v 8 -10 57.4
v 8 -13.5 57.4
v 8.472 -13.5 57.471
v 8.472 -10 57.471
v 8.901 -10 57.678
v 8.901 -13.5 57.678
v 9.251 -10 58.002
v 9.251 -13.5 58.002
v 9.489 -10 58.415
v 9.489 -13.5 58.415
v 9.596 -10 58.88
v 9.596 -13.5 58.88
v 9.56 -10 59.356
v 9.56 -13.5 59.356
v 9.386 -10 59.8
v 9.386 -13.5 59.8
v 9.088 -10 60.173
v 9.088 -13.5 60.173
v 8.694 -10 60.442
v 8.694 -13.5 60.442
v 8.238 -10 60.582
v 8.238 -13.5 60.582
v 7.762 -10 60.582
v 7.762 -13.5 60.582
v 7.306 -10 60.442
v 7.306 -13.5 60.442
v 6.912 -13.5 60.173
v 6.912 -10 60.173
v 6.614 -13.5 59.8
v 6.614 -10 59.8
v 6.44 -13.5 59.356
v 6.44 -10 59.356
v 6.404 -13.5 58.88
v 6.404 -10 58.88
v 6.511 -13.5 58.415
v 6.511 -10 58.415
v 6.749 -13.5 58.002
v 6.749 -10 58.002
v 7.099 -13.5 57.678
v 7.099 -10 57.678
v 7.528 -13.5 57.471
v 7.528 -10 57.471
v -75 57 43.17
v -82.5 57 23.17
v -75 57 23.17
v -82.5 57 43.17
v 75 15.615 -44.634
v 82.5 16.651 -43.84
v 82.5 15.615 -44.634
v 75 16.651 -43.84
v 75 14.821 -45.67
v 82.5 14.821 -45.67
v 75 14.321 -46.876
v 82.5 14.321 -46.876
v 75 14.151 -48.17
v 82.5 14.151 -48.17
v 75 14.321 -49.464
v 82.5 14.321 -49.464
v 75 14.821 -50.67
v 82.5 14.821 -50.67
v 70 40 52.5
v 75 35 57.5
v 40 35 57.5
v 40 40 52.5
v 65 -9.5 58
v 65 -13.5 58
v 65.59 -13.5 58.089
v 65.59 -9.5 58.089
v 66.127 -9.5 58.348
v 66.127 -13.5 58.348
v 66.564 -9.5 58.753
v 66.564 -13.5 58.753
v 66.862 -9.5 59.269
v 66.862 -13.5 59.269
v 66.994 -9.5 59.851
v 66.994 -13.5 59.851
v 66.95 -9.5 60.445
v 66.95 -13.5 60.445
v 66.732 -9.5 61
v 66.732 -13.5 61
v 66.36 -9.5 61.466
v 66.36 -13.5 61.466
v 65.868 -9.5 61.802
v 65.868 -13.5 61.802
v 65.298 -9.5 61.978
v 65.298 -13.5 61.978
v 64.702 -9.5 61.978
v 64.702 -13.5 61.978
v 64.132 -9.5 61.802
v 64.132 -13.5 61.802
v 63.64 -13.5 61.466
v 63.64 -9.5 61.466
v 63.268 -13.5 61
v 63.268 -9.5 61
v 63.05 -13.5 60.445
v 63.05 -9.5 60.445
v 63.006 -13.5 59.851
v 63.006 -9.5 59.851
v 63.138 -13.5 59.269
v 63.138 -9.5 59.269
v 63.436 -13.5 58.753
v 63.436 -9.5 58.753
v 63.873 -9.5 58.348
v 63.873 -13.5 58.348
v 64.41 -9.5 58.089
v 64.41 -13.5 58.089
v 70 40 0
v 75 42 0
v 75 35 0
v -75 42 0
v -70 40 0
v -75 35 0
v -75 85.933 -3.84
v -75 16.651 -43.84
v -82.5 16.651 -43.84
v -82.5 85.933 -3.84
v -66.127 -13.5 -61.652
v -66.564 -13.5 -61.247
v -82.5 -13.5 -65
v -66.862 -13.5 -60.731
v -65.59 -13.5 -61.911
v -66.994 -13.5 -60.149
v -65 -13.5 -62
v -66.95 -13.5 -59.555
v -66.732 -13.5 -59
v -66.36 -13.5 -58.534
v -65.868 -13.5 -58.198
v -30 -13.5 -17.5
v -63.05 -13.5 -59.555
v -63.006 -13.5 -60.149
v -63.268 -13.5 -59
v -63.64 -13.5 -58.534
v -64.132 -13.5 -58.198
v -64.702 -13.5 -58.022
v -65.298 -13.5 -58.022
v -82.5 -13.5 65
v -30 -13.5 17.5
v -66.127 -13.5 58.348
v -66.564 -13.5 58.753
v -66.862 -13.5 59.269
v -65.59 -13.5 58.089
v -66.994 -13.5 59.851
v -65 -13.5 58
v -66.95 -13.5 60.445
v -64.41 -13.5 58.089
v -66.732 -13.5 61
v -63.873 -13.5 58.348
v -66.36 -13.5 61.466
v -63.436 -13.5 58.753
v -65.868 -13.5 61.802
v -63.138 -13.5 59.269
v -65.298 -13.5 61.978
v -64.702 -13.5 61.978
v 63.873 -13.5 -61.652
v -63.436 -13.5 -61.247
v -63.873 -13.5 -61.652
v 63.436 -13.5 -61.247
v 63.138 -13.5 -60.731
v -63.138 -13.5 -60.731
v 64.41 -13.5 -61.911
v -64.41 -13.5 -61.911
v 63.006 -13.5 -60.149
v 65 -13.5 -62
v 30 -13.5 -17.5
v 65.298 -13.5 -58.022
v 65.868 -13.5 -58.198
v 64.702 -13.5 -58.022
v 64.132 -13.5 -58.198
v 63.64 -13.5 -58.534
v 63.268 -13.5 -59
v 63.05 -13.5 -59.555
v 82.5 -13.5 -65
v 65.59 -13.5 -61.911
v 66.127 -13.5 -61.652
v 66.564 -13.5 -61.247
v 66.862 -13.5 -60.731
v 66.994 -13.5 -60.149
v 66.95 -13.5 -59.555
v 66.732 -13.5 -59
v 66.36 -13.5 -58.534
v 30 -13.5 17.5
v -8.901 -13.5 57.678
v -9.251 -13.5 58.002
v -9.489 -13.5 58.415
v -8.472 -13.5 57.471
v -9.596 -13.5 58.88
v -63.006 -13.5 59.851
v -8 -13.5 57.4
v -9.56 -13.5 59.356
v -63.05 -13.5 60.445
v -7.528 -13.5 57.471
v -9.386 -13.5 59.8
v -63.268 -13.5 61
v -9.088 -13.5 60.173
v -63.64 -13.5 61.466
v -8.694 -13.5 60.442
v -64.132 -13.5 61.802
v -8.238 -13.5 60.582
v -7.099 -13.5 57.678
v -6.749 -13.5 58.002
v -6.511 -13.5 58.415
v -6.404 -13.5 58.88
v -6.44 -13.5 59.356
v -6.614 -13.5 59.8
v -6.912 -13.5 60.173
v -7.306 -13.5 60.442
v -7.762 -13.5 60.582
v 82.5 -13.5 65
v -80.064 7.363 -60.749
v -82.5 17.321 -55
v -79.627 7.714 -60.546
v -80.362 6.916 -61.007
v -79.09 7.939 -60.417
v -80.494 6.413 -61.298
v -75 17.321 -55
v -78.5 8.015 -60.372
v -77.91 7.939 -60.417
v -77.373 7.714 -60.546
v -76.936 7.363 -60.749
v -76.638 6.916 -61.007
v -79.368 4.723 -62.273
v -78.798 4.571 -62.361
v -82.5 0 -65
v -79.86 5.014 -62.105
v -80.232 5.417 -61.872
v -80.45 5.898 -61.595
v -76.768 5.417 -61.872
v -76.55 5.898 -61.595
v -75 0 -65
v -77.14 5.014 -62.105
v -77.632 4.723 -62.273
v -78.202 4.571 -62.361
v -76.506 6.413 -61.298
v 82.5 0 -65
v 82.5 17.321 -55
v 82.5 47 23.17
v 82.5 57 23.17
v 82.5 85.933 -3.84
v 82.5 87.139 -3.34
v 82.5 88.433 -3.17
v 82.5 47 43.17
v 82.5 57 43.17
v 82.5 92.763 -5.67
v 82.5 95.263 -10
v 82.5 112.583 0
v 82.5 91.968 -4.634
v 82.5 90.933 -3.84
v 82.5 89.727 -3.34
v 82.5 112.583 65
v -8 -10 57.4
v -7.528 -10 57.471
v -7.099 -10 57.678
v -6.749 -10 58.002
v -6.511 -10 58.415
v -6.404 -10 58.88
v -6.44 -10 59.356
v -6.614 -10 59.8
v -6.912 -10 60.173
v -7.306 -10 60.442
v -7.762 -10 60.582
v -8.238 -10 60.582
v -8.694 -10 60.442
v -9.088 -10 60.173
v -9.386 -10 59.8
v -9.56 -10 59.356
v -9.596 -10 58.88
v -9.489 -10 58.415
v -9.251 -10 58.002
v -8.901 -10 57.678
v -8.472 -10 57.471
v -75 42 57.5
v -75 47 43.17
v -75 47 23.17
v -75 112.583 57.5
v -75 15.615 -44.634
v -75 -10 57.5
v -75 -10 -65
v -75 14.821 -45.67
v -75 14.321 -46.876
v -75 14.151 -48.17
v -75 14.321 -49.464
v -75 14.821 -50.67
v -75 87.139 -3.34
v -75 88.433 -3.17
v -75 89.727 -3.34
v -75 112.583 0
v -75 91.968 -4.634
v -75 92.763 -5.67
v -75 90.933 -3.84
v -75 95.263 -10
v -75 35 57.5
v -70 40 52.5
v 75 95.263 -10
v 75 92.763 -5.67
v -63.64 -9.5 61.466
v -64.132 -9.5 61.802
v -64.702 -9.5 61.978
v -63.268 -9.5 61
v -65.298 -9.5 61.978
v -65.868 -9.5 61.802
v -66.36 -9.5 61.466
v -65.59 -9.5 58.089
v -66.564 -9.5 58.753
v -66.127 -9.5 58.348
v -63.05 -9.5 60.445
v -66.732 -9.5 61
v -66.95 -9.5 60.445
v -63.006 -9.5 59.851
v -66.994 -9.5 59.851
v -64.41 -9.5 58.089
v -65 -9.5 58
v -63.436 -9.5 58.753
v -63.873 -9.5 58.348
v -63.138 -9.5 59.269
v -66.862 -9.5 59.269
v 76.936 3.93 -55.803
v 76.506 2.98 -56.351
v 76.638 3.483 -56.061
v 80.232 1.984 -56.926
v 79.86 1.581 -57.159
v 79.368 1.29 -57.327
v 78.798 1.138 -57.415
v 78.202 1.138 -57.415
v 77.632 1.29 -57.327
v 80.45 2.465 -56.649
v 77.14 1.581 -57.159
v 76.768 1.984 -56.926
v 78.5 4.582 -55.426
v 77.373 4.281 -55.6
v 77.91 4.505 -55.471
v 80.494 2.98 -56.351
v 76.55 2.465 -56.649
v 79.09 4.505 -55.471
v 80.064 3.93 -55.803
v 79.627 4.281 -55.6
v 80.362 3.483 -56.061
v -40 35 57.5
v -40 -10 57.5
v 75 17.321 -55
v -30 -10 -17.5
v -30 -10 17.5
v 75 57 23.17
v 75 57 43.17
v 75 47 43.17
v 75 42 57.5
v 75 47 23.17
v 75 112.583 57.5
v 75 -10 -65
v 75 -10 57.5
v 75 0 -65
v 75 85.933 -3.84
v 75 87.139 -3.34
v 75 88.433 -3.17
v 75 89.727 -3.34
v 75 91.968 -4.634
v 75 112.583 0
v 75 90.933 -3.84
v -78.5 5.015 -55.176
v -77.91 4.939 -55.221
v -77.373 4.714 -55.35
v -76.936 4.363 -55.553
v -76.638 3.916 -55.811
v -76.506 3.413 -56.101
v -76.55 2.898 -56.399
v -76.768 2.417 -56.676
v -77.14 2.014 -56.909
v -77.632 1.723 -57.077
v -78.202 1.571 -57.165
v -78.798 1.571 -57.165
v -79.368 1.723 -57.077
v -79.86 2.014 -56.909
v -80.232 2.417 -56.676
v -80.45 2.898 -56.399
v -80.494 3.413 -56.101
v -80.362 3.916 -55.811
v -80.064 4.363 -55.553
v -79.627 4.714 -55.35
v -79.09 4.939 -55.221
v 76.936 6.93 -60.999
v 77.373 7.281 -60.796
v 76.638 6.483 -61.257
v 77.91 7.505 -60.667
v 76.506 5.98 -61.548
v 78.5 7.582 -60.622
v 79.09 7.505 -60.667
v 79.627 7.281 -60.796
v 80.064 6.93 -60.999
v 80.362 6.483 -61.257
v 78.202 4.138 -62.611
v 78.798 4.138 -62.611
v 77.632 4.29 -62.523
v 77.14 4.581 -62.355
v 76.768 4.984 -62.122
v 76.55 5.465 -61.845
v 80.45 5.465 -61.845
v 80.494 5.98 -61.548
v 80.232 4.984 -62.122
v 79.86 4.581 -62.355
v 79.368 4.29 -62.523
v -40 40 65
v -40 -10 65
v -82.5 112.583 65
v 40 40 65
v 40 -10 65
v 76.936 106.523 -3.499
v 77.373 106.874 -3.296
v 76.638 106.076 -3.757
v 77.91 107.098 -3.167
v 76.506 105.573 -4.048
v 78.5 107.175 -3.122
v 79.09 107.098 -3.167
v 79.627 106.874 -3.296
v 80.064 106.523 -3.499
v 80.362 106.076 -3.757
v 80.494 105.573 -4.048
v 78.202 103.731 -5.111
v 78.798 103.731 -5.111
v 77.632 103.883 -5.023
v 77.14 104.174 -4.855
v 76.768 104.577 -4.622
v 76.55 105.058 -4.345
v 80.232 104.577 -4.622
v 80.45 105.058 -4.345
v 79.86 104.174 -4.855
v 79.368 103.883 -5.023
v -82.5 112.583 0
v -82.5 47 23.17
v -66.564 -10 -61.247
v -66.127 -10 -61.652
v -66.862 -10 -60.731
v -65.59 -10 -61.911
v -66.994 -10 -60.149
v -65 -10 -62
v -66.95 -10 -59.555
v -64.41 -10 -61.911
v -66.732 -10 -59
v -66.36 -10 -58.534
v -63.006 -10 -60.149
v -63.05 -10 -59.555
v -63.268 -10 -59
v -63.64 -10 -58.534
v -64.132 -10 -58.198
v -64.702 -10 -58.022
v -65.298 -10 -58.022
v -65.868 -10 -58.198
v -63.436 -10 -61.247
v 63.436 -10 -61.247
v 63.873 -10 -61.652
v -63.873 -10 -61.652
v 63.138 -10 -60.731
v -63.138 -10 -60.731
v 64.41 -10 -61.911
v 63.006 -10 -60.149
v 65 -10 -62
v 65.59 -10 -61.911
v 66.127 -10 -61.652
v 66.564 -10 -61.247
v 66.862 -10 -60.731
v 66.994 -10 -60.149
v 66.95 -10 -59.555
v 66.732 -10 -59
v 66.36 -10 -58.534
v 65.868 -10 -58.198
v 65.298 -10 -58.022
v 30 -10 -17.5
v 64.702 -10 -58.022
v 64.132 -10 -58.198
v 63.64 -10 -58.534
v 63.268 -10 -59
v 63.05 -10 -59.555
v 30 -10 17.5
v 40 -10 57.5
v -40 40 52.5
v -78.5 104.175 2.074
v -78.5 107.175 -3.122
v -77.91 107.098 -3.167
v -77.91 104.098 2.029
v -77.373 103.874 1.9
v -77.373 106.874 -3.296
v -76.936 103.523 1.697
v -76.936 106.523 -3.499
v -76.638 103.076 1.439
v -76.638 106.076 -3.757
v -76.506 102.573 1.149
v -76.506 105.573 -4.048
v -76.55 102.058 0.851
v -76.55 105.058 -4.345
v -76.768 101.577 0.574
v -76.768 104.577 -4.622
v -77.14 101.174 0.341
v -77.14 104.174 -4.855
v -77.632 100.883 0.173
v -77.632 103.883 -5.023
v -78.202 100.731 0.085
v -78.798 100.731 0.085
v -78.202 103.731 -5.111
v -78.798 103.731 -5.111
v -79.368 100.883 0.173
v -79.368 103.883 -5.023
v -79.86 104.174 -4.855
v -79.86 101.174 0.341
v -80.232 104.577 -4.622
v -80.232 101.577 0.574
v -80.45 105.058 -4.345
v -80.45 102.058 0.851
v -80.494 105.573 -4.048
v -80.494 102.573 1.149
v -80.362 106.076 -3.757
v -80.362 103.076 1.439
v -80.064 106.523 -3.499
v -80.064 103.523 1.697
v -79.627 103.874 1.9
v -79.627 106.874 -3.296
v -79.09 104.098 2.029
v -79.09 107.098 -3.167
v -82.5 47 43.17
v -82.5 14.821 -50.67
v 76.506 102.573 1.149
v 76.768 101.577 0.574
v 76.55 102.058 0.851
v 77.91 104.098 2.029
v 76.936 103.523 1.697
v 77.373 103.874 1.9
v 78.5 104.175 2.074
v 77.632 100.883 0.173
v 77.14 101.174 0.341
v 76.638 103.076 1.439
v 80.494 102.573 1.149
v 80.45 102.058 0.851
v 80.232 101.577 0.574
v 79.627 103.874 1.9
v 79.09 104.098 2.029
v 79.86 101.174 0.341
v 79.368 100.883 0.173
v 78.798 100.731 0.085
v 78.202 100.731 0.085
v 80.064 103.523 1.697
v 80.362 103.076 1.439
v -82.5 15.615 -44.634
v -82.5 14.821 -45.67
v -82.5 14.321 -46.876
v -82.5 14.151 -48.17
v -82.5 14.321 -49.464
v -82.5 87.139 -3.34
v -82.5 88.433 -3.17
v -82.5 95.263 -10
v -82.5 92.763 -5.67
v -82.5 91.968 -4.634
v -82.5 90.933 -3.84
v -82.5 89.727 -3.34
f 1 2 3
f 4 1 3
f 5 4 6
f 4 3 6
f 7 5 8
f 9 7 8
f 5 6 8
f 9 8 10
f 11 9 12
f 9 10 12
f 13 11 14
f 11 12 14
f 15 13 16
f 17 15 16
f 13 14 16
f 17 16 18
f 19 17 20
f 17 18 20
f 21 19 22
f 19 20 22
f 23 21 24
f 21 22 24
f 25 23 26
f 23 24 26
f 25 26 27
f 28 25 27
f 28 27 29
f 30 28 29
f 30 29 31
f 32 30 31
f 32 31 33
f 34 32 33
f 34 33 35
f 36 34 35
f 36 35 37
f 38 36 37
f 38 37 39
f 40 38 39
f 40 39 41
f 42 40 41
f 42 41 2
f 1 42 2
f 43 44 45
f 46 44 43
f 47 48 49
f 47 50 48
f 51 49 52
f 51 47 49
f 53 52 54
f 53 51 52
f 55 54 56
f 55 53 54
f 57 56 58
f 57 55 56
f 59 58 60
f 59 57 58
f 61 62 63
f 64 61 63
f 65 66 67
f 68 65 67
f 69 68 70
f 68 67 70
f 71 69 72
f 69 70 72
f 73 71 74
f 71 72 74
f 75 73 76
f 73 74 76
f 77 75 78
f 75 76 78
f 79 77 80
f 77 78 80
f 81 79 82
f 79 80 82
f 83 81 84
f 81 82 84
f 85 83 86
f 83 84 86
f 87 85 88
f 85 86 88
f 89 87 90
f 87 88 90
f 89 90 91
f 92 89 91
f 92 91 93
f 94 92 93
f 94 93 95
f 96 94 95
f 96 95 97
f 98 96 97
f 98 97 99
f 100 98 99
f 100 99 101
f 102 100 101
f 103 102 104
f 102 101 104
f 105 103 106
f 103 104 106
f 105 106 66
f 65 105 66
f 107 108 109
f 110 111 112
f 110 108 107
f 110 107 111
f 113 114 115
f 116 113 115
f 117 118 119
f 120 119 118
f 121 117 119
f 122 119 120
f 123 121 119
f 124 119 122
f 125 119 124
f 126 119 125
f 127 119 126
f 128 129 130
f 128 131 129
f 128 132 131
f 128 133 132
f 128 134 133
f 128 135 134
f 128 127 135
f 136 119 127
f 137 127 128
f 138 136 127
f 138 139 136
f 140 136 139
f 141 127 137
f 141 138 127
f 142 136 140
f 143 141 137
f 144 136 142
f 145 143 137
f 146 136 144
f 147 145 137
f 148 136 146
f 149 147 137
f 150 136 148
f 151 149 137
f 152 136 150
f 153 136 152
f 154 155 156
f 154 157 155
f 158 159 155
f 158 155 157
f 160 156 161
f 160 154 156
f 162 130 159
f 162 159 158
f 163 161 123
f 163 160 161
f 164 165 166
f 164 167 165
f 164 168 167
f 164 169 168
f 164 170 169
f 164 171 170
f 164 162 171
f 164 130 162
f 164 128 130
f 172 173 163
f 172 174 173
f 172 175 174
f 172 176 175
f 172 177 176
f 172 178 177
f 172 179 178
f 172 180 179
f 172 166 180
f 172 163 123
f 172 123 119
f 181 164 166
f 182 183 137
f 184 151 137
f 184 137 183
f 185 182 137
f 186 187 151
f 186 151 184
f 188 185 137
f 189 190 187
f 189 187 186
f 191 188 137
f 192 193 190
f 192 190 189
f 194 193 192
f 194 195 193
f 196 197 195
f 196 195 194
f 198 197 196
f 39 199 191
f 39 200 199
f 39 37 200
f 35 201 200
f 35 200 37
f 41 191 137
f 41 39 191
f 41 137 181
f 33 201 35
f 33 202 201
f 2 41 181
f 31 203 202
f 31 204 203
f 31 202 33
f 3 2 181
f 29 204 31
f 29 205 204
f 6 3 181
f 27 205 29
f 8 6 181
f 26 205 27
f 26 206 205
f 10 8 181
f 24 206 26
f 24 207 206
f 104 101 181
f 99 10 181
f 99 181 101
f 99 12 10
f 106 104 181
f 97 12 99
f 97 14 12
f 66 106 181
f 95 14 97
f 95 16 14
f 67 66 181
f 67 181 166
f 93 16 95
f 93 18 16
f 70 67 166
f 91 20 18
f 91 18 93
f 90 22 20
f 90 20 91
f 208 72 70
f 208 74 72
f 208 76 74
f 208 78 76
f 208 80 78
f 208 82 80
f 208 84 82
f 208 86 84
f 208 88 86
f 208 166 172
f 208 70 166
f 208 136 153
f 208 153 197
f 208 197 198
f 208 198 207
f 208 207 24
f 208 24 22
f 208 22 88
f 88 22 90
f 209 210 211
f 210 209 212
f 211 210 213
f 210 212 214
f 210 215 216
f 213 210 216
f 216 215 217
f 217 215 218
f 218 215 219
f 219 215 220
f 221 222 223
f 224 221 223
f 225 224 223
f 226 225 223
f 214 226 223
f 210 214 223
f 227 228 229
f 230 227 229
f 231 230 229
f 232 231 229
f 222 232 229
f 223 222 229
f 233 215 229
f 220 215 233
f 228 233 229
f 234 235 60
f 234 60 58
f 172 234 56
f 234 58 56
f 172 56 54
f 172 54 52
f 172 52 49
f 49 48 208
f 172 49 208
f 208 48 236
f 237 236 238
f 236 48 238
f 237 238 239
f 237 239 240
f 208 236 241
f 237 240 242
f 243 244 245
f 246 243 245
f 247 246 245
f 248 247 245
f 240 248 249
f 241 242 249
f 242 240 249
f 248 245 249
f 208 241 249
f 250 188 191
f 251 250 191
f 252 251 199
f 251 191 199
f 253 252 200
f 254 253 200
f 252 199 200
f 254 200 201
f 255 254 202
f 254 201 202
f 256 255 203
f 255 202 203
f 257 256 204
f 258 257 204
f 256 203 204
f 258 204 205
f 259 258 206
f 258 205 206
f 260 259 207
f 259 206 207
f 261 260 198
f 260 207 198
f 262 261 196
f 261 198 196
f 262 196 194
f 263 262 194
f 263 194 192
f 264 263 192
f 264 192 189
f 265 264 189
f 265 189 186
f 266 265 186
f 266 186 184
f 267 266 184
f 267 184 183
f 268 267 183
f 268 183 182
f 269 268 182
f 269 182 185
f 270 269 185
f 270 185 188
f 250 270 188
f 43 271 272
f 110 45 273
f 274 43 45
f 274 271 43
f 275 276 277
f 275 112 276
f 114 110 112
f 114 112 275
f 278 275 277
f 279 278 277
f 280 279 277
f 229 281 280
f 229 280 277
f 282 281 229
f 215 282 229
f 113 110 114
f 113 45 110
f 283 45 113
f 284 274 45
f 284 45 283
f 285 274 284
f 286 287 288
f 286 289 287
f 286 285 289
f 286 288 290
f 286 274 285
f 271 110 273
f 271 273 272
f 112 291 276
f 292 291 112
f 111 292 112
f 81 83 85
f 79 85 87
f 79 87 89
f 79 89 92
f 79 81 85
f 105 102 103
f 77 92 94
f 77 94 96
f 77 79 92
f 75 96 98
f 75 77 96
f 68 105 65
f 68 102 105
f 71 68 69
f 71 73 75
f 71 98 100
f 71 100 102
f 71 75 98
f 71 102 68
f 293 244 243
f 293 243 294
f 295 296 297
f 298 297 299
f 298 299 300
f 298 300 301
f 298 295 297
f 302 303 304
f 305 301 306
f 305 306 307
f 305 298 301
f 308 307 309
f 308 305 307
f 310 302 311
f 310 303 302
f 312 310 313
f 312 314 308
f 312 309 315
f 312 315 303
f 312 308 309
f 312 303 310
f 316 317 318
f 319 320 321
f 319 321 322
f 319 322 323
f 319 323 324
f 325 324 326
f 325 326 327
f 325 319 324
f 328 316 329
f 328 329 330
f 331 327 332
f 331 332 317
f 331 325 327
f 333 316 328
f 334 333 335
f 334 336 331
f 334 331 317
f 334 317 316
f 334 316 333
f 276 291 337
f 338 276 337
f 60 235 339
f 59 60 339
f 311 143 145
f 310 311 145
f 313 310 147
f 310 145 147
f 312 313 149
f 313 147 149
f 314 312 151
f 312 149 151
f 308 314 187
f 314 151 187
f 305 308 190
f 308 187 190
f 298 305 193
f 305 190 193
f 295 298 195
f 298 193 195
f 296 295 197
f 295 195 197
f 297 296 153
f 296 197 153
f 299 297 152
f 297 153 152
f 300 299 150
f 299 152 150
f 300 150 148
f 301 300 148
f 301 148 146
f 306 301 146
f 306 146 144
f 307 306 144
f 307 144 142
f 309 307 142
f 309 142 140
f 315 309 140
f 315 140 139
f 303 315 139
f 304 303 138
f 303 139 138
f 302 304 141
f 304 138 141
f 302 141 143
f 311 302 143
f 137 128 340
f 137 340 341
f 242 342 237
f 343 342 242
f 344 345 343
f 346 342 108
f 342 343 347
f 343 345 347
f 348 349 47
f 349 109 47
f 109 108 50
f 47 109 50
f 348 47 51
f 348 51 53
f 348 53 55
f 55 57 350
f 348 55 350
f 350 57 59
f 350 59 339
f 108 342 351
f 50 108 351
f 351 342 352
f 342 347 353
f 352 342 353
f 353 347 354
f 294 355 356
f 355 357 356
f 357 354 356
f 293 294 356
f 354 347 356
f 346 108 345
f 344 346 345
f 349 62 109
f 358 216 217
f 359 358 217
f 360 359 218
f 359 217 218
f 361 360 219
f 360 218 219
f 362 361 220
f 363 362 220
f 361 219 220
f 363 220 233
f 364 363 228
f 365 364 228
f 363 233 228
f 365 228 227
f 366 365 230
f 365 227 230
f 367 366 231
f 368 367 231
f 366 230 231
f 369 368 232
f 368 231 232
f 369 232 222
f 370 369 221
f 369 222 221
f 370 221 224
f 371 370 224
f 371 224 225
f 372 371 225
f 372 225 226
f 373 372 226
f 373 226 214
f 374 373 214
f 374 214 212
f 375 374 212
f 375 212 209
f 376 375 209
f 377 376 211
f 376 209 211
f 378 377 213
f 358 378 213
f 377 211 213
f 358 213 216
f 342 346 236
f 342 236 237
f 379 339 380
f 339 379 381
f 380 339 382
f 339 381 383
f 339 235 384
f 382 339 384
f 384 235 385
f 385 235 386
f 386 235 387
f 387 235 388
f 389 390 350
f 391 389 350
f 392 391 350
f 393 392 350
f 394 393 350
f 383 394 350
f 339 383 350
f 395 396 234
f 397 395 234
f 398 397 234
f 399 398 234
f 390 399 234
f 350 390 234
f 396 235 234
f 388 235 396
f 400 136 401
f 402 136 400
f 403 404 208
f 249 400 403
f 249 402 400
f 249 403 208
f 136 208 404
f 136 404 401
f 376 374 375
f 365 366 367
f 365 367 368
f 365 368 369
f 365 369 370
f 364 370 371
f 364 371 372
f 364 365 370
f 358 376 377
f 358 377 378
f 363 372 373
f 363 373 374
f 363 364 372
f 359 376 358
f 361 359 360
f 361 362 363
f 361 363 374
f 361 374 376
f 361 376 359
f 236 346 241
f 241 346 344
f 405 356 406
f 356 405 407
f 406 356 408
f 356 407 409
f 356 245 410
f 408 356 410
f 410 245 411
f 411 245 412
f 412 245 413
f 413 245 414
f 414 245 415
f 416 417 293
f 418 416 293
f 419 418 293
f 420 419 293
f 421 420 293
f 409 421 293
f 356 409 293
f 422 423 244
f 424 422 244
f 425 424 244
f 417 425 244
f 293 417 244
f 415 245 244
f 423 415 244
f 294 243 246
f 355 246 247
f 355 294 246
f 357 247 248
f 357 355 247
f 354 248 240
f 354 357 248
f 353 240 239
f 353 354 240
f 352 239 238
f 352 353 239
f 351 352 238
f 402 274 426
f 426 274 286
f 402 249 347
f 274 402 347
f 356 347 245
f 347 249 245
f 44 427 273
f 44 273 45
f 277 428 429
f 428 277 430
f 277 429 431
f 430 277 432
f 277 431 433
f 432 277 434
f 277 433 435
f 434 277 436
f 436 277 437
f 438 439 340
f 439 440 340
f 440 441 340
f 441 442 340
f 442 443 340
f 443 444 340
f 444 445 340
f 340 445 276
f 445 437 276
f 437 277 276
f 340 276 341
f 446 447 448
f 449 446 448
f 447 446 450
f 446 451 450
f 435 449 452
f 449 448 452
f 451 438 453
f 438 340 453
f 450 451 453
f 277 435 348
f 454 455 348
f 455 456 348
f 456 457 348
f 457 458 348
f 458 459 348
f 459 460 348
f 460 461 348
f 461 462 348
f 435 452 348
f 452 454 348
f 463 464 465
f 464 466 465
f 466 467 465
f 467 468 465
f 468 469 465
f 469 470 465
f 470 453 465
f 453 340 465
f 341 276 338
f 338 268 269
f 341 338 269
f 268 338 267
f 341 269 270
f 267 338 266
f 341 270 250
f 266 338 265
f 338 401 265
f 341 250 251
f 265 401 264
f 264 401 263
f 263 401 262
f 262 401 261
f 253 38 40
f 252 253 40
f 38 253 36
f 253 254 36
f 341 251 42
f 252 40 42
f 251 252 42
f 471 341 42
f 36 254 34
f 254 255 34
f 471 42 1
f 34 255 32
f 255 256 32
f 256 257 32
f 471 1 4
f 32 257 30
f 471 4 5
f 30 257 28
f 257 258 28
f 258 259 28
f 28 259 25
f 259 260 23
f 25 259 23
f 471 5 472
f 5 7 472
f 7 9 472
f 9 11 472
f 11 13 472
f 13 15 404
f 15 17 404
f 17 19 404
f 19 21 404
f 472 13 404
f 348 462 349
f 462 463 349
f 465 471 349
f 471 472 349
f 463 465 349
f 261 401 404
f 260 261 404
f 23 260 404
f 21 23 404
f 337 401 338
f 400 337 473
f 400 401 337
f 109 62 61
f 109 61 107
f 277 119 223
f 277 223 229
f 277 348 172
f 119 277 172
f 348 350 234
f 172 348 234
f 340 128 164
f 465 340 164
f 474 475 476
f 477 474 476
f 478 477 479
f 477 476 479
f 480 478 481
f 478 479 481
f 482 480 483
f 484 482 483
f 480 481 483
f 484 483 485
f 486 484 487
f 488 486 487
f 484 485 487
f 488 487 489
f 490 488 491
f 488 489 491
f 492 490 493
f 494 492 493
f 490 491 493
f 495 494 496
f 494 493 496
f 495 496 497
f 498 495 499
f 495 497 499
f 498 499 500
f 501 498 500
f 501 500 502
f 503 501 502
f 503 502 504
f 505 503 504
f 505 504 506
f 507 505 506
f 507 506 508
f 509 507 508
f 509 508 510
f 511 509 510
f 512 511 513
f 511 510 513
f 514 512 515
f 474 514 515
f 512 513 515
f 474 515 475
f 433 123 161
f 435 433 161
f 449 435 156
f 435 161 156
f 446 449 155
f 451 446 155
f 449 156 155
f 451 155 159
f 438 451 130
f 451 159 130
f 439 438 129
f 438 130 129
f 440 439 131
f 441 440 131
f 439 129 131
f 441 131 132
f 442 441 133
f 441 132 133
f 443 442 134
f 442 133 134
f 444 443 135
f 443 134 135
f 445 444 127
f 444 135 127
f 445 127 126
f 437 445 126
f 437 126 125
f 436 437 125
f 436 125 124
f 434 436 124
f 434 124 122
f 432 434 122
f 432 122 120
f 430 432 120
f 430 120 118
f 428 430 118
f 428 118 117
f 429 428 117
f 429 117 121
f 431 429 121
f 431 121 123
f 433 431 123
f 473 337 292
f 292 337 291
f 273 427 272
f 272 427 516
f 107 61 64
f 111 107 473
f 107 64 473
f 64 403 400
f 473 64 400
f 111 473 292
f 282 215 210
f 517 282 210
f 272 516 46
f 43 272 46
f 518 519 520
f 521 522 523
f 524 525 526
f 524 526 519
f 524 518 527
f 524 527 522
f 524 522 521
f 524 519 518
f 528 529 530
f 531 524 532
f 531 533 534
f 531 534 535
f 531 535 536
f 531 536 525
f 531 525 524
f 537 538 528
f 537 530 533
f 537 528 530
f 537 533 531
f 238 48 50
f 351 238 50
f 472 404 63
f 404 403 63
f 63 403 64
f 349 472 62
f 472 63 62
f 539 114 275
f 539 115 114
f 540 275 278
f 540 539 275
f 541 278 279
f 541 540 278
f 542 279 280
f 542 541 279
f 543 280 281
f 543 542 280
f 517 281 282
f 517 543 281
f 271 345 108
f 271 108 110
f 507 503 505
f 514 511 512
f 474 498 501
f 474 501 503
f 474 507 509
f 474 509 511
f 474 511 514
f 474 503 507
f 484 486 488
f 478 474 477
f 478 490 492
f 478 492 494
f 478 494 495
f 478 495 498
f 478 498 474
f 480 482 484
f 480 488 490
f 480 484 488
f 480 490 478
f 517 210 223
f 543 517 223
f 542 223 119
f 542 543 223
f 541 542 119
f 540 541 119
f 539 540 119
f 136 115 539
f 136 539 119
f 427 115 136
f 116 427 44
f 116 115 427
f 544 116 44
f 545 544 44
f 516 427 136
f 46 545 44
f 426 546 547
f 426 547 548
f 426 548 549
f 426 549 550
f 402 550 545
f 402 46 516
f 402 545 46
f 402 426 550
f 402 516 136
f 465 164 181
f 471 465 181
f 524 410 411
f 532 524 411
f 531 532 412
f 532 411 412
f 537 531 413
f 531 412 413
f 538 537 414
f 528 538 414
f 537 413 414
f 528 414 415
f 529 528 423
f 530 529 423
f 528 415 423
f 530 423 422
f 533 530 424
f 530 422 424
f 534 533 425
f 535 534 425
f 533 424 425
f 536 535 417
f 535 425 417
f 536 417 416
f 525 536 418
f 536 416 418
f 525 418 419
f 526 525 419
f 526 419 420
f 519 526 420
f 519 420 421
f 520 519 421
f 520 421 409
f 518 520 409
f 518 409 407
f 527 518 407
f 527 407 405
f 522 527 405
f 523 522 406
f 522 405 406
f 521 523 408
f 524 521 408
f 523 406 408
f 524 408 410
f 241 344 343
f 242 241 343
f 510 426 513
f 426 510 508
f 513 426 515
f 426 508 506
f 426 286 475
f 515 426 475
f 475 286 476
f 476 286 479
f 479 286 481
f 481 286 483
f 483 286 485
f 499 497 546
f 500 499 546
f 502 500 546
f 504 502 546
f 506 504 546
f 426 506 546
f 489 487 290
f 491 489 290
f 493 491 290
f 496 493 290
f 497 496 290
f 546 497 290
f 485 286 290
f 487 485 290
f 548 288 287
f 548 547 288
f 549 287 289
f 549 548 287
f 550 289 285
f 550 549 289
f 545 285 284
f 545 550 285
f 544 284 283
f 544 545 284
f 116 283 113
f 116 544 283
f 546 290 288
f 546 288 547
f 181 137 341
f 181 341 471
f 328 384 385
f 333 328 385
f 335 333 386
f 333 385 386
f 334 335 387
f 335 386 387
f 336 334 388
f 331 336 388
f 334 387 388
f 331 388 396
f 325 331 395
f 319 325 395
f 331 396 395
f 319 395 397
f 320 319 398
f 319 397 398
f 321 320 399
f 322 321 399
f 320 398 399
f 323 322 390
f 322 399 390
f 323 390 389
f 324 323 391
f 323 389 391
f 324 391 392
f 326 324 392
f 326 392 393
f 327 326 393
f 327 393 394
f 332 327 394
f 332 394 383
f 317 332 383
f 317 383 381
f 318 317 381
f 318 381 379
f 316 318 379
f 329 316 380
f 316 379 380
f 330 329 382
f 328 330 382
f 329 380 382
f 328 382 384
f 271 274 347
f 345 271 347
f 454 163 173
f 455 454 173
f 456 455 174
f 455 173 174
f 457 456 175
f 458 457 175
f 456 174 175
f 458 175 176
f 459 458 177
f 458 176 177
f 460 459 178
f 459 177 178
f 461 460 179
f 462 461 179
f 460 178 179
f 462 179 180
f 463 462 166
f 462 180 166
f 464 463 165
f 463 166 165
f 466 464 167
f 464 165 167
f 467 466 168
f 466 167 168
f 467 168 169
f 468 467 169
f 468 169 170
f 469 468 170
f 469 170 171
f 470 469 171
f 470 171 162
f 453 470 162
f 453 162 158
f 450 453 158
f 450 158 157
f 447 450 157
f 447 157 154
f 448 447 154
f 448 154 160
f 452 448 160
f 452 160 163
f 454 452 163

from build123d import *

# Parameters (mm, degrees)
BOSS_EXTRUDE1_DEPTH = 82.5
SKETCH4_W           = 165
SKETCH4_H           = 90
CUT_EXTRUDE1_DEPTH  = 10
SKETCH6_W           = 150
SKETCH6_H           = 122.5
CUT_EXTRUDE2_DEPTH  = 154.968340902
SKETCH7_W           = 80
SKETCH7_H           = 40
CUT_EXTRUDE3_DEPTH  = 60
SKETCH8_W           = 150
SKETCH8_H           = 2
BOSS_EXTRUDE2_DEPTH = 57.5
SKETCH9_W           = 20
SKETCH9_H           = 10
CUT_EXTRUDE4_DEPTH  = 211.059515376
SKETCH10_R          = 2
CUT_EXTRUDE5_DEPTH  = 6
CHAMFER1_SIZE       = 5
FILLET1_R           = 5
BOSS_EXTRUDE3_DEPTH = 10
SKETCH17_W          = 165
SKETCH17_H          = 130
BOSS_EXTRUDE4_DEPTH = 3.5
SKETCH16_R          = 2
CUT_EXTRUDE6_DEPTH  = 4
SKETCH19_R          = 1.6
SKETCH19_W          = 60
SKETCH19_H          = 35
CUT_EXTRUDE7_DEPTH  = 10


with BuildPart() as part:
    # Sketch2 → Boss-Extrude1 (new, symmetric)
    with BuildSketch(Plane(origin=(0, 0, 0), x_dir=(0, 0, -1), z_dir=(1, 0, 0))):
        Polygon((0, 112.583302492), (65, 0), (0, 0), (-65, 0), (-65, 112.583302492), align=None)
    extrude(amount=BOSS_EXTRUDE1_DEPTH, both=True)

    # Sketch4 → Cut-Extrude1 (cut)
    with BuildSketch(Plane(origin=(0, 28.145825623, -48.75), x_dir=(-1, 0, 0), z_dir=(0, 0.5000000000000044, -0.8660254037844362))):
        with Locations((0, 32.5)):
            Rectangle(SKETCH4_W, SKETCH4_H)
    extrude(amount=-CUT_EXTRUDE1_DEPTH, mode=Mode.SUBTRACT)

    # Sketch6 → Cut-Extrude2 (cut, through all)
    with BuildSketch(Plane(origin=(0, 112.583302492, 0), x_dir=(1, 0, 0), z_dir=(0, 1, 0))):
        with Locations((0, 3.75)):
            Rectangle(SKETCH6_W, SKETCH6_H)
    extrude(amount=-CUT_EXTRUDE2_DEPTH, mode=Mode.SUBTRACT)

    # Sketch7 → Cut-Extrude3 (cut)
    with BuildSketch(Plane.XY.offset(65)):
        with Locations((0, 20)):
            Rectangle(SKETCH7_W, SKETCH7_H)
    extrude(amount=-CUT_EXTRUDE3_DEPTH, mode=Mode.SUBTRACT)

    # Sketch8 → Boss-Extrude2 (add)
    with BuildSketch(Plane(origin=(0, 0, 57.5), x_dir=(-1, 0, 0), z_dir=(0, 0, -1))):
        with Locations((0, 41)):
            Rectangle(SKETCH8_W, SKETCH8_H)
    extrude(amount=BOSS_EXTRUDE2_DEPTH)

    # Sketch9 → Cut-Extrude4 (cut, through all)
    with BuildSketch(Plane.ZY.offset(82.5)):
        with Locations((33.170135622, 52)):
            Rectangle(SKETCH9_W, SKETCH9_H)
    extrude(amount=-CUT_EXTRUDE4_DEPTH, mode=Mode.SUBTRACT)

    # Sketch10 → Cut-Extrude5 (cut)
    with BuildSketch(Plane(origin=(0, 28.145825623, -48.75), x_dir=(-1, 0, 0), z_dir=(0, 0.5000000000000038, -0.8660254037844366))):
        with Locations(Location((-78.5, 89.25545404, 0), (0, 0, 90))):
            Circle(SKETCH10_R)
        with Locations(Location((78.5, 89.25545404, 0), (0, 0, 90))):
            Circle(SKETCH10_R)
        with Locations(Location((78.5, -25.24454596, 0), (0, 0, 90))):
            Circle(SKETCH10_R)
        with Locations(Location((-78.5, -25.74454596, 0), (0, 0, 90))):
            Circle(SKETCH10_R)
    extrude(amount=-CUT_EXTRUDE5_DEPTH, mode=Mode.SUBTRACT)

    # Chamfer1
    chamfer1_edges = [part.edges().sort_by_distance(p)[0] for p in [
        (57.5, 40, 57.5),
        (-57.5, 40, 57.5),
        (75, 40, 28.75),
        (-75, 40, 28.75),
    ]]
    chamfer(chamfer1_edges, length=CHAMFER1_SIZE)

    # Fillet1
    fillet1_edges = [part.edges().sort_by_distance(p)[0] for p in [
        (-78.75, 90.262794416, -1.339745962),
        (78.75, 12.320508076, -46.339745962),
        (-78.75, 12.320508076, -46.339745962),
        (78.75, 90.262794416, -1.339745962),
    ]]
    fillet(fillet1_edges, radius=FILLET1_R)

    # Sketch12 → Boss-Extrude3 (add)
    with BuildSketch(Plane.XZ):
        Polygon((82.5, 65), (40, 65), (40, 57.5), (75, 57.5), (75, -65), (82.5, -65), align=None)
        Polygon((-75, 57.5), (-40, 57.5), (-40, 65), (-82.5, 65), (-82.5, -65), (-75, -65), align=None)
    extrude(amount=BOSS_EXTRUDE3_DEPTH)

    # Sketch17 → Boss-Extrude4 (add)
    with BuildSketch(Plane.XZ.offset(10)):
        Rectangle(SKETCH17_W, SKETCH17_H)
    extrude(amount=BOSS_EXTRUDE4_DEPTH)

    # Sketch16 → Cut-Extrude6 (cut)
    with BuildSketch(Plane.XZ.offset(13.5)):
        with Locations(Location((-65, 60, 0), (0, 0, 270))):
            Circle(SKETCH16_R)
        with Locations(Location((65, 60, 0), (0, 0, 270))):
            Circle(SKETCH16_R)
        with Locations(Location((65, -60, 0), (0, 0, 270))):
            Circle(SKETCH16_R)
        with Locations(Location((-65, -60, 0), (0, 0, 270))):
            Circle(SKETCH16_R)
    extrude(amount=-CUT_EXTRUDE6_DEPTH, mode=Mode.SUBTRACT)

    # Sketch19 → Cut-Extrude7 (cut)
    with BuildSketch(Plane.XZ.offset(13.5)):
        with Locations(Location((-8, 59, 0), (0, 0, 270))):
            Circle(SKETCH19_R)
        with Locations(Location((8, 59, 0), (0, 0, 270))):
            Circle(SKETCH19_R)
        Rectangle(SKETCH19_W, SKETCH19_H)
    extrude(amount=-CUT_EXTRUDE7_DEPTH, mode=Mode.SUBTRACT)


solid = part.part
